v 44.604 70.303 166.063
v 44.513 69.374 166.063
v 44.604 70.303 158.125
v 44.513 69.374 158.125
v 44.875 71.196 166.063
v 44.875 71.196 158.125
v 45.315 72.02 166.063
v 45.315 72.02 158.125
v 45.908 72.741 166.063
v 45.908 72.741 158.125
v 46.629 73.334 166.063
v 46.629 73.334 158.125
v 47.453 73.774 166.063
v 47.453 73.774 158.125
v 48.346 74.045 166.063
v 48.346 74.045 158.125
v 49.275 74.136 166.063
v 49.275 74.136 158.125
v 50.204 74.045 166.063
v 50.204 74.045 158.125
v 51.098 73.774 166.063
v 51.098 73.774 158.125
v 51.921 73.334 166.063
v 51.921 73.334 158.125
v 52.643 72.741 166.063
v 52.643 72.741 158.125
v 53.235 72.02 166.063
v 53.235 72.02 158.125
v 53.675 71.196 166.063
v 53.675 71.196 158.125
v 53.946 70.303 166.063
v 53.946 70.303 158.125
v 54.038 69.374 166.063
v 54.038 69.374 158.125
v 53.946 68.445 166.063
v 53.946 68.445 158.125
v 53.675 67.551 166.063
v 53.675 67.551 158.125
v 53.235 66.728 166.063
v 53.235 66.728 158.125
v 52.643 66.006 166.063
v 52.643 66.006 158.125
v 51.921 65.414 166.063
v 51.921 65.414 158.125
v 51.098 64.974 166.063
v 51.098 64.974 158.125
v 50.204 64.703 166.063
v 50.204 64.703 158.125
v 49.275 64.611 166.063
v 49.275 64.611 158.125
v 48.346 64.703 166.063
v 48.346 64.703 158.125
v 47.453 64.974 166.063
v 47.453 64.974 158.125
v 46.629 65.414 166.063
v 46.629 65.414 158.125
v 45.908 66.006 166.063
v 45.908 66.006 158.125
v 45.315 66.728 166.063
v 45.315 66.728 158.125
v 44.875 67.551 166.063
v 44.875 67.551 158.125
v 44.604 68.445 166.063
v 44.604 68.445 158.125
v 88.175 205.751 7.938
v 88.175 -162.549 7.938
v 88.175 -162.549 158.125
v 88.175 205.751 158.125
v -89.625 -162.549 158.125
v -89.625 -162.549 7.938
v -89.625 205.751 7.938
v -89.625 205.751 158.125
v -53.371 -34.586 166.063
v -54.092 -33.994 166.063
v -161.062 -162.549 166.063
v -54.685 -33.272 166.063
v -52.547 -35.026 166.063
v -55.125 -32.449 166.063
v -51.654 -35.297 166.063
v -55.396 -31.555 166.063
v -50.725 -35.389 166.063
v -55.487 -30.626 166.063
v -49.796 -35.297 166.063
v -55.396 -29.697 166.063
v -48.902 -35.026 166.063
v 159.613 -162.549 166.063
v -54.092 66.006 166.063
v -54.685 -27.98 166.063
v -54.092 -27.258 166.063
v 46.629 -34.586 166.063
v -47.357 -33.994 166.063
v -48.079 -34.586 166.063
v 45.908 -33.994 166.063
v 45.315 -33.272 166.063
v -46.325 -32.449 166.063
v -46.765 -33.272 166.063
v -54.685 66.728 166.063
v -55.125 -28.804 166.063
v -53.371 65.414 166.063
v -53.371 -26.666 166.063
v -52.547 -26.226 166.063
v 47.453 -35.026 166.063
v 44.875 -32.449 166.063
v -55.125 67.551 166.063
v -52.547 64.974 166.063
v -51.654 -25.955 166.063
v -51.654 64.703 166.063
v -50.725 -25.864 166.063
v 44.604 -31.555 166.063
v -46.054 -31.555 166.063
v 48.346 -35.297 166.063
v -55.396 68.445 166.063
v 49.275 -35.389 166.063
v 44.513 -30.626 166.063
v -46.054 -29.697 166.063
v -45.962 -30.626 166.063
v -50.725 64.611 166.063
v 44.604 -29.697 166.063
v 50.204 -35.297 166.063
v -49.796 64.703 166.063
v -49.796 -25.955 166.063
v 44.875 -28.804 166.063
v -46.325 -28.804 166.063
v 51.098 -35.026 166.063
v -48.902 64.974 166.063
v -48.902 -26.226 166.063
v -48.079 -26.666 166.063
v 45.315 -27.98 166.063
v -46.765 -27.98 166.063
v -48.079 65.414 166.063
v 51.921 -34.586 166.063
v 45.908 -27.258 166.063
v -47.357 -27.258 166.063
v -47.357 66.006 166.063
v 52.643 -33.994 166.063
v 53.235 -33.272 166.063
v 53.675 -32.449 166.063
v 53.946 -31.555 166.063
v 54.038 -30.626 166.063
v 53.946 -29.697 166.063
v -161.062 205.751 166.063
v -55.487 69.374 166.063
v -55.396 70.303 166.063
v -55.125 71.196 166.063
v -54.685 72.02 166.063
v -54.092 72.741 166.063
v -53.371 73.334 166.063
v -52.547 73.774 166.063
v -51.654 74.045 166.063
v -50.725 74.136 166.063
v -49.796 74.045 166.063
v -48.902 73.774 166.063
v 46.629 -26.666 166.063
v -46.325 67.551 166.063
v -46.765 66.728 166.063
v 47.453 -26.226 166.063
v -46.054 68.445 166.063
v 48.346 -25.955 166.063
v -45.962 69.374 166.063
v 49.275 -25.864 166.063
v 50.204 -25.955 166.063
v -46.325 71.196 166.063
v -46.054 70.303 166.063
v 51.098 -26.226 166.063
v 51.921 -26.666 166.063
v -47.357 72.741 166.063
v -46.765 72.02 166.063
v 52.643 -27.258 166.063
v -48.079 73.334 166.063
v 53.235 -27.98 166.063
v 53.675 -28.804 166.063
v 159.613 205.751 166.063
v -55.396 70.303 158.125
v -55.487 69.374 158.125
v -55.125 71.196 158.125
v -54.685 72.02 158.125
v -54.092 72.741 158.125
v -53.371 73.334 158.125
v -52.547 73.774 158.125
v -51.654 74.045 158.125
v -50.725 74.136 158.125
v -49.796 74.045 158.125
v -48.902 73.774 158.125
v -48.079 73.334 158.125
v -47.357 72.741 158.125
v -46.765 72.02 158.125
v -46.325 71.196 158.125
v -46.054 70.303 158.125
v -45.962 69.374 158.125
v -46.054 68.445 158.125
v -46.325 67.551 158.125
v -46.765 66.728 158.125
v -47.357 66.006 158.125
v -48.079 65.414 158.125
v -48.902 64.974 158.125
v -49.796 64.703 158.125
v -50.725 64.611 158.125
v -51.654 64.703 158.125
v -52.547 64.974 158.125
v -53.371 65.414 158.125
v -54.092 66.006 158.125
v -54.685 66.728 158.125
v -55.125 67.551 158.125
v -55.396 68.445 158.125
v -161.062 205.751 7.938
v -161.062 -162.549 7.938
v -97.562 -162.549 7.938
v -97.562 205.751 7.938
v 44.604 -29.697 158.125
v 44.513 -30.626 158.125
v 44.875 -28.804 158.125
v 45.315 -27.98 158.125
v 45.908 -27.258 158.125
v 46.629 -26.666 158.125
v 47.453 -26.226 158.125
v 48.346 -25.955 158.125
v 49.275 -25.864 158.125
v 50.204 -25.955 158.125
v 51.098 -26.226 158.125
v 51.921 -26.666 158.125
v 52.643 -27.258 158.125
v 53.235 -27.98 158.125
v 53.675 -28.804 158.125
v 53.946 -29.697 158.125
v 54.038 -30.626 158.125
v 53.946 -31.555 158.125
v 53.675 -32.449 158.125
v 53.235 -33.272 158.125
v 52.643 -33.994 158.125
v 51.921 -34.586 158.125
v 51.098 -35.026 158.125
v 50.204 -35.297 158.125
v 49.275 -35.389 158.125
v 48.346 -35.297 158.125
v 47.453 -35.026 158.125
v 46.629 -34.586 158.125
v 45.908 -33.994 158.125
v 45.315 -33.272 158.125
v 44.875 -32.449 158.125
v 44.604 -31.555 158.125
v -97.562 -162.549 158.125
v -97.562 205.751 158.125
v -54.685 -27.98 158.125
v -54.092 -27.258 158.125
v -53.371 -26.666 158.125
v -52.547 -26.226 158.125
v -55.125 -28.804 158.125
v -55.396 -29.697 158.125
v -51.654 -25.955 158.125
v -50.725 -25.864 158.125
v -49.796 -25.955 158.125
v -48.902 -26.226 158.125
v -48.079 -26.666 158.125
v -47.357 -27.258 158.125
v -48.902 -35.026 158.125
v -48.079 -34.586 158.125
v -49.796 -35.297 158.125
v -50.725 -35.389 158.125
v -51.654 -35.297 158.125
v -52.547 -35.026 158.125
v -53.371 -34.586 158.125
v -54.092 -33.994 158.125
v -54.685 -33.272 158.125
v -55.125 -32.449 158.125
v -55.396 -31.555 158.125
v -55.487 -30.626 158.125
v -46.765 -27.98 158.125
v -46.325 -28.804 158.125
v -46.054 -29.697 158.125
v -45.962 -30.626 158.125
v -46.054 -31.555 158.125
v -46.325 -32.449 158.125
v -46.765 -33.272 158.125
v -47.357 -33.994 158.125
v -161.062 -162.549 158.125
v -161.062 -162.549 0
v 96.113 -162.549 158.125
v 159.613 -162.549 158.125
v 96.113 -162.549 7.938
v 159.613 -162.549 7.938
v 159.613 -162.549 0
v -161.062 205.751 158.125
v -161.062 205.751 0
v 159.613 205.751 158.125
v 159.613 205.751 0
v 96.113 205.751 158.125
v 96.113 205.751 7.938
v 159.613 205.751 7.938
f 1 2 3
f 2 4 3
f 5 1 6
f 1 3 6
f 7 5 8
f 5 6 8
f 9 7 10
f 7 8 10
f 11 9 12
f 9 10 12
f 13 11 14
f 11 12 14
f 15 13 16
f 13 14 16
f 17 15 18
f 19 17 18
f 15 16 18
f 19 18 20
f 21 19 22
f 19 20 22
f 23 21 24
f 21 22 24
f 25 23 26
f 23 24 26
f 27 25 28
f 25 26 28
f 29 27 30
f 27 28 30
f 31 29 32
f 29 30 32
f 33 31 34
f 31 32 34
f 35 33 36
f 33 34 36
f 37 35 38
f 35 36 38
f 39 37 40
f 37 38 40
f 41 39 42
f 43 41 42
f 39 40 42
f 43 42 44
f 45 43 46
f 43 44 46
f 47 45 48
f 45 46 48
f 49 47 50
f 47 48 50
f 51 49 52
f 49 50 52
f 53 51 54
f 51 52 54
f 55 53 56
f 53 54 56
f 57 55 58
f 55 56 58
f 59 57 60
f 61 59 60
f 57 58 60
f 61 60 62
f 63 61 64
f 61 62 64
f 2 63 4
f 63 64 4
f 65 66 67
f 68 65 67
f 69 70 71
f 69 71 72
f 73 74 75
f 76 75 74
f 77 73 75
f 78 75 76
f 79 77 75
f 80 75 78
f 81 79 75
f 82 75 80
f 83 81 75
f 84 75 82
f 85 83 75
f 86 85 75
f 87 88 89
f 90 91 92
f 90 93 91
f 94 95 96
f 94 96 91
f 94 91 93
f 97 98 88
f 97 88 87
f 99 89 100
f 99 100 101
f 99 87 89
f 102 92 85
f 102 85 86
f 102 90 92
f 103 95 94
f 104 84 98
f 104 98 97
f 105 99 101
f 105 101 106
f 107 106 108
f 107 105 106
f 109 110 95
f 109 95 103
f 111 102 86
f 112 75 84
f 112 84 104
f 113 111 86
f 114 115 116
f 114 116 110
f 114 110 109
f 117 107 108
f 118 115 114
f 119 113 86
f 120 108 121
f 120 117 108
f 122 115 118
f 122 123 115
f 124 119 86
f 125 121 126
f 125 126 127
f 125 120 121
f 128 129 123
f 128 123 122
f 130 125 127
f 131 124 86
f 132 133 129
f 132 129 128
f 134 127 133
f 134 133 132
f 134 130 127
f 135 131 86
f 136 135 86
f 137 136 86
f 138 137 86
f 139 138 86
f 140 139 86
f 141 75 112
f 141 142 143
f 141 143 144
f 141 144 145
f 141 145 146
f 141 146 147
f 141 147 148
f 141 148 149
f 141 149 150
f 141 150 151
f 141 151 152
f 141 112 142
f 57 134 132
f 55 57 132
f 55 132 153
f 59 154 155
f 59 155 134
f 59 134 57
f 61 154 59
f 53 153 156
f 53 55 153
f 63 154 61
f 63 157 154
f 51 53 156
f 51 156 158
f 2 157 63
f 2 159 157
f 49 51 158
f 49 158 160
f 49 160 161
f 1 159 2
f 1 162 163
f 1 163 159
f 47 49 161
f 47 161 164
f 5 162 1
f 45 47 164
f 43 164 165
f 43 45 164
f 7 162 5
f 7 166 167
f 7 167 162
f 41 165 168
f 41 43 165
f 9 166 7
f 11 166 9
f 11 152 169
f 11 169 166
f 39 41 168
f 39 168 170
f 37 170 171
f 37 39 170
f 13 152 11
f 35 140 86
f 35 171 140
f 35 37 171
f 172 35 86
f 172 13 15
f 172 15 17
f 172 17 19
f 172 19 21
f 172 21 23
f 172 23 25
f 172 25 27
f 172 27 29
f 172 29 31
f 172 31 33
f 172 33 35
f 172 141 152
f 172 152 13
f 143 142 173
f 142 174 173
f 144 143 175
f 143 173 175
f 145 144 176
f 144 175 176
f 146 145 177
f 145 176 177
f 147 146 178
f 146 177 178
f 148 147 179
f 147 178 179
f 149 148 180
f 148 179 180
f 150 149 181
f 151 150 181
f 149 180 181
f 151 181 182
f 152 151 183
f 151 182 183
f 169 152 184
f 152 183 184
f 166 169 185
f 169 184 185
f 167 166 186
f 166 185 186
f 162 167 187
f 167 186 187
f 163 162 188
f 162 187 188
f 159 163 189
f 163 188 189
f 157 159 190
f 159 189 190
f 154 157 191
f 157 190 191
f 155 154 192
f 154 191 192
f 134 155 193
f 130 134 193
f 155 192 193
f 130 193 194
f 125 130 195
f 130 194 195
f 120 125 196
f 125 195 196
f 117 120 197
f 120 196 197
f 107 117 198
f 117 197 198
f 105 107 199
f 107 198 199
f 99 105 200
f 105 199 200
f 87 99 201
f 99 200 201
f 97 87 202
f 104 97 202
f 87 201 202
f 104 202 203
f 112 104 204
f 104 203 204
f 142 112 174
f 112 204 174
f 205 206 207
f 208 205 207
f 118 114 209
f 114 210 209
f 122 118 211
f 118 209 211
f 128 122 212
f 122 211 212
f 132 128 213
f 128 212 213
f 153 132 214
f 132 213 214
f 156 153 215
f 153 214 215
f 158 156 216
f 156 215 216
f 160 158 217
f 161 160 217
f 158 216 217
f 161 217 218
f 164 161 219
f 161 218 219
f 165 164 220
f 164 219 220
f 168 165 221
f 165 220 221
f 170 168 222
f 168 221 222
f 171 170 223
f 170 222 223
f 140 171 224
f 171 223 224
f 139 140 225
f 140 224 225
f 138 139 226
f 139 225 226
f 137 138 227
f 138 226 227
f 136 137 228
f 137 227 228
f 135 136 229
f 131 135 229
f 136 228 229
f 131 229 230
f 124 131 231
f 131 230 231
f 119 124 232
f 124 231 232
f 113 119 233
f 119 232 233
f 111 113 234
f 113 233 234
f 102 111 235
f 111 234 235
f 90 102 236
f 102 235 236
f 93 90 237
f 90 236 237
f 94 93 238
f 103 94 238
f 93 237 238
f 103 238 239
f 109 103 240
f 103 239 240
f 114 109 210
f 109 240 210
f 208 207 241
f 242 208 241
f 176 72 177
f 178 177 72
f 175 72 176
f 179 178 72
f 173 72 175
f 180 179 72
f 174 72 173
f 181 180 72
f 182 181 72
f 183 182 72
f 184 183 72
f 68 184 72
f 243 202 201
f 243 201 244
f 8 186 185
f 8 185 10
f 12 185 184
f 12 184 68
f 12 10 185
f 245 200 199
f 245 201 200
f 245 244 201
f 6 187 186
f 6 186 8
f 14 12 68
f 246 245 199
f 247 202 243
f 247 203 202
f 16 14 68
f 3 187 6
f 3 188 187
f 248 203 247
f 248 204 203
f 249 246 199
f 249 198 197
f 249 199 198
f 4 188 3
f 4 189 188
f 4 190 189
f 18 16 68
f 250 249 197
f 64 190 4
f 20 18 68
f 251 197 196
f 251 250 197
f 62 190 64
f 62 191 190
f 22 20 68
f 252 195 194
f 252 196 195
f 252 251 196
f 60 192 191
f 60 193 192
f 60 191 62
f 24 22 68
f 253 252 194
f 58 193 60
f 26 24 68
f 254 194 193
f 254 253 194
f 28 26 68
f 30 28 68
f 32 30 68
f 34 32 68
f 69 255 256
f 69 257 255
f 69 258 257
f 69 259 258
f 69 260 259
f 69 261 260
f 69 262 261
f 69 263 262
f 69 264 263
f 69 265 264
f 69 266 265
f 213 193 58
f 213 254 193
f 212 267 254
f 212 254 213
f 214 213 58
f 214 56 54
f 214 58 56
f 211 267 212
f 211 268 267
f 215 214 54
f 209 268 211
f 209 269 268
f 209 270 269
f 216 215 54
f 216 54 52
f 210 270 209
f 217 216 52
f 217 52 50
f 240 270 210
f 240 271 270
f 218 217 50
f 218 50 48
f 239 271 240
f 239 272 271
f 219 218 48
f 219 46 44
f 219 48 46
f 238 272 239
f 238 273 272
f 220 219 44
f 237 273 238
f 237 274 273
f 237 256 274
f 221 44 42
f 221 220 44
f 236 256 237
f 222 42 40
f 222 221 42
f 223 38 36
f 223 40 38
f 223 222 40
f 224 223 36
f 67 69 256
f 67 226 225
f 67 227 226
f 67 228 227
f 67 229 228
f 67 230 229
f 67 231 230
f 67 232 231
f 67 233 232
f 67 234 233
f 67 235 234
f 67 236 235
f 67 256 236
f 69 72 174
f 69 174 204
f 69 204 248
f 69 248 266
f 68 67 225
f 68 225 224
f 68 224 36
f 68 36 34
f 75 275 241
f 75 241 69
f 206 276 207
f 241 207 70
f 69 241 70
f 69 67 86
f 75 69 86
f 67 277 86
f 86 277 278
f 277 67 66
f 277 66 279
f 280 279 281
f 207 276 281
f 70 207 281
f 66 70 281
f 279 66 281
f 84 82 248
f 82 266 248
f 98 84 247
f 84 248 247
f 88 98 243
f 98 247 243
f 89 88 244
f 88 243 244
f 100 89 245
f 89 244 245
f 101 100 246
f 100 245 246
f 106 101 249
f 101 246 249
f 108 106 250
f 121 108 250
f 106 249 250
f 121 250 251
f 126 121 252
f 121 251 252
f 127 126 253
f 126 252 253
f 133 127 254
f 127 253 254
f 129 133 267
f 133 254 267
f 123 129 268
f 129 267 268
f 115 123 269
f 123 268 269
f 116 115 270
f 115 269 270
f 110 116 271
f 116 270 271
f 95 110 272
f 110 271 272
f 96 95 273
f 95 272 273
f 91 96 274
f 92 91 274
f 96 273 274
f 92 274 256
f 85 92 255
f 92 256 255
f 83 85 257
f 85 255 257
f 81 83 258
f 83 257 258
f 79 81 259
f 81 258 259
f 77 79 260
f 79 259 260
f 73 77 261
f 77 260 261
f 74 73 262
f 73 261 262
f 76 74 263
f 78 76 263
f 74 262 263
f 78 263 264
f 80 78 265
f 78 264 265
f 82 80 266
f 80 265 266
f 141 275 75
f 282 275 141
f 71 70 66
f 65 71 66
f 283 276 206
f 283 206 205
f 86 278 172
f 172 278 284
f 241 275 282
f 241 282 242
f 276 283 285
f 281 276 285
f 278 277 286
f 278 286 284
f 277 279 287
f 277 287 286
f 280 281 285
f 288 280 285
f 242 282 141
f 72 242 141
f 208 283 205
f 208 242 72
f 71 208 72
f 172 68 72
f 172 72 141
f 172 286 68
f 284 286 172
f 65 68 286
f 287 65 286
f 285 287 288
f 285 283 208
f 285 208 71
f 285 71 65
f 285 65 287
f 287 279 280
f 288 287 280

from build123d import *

# Parameters (mm, degrees)
F0_W     = 320.675
F0_H     = 368.3
F1_DEPTH = 166.06266
F3_D     = 9.525
F3_DEPTH = 38.1
F4_W     = 63.5
F4_H     = 150.18766
F4_W_2   = 177.8
F5_DEPTH = 368.301


with BuildPart() as f1:
    # F0 (on Top) → F1 (new body)
    with BuildSketch(Plane.XY):
        with Locations((-0.724893, 21.601411)):
            Rectangle(F0_W, F0_H)
    extrude(amount=F1_DEPTH)

    # F3
    with Locations(Plane.XY.offset(166.06266)):
        with Locations((-50.724693, 69.373731), (49.275107, 69.373731), (49.275107, -30.626069), (-50.724693, -30.626069)):
            Hole(F3_D / 2, depth=F3_DEPTH)

    # F4 (on face) → F5 (cut, through all)
    with BuildSketch(Plane.XZ.offset(162.548589)):
        with Locations((-129.312393, 83.03133)):
            Rectangle(F4_W, F4_H)
        with Locations((127.862607, 83.03133)):
            Rectangle(F4_W, F4_H)
        with Locations((-0.724893, 83.03133)):
            Rectangle(F4_W_2, F4_H)
    extrude(amount=-F5_DEPTH, mode=Mode.SUBTRACT)


solid = f1.part
